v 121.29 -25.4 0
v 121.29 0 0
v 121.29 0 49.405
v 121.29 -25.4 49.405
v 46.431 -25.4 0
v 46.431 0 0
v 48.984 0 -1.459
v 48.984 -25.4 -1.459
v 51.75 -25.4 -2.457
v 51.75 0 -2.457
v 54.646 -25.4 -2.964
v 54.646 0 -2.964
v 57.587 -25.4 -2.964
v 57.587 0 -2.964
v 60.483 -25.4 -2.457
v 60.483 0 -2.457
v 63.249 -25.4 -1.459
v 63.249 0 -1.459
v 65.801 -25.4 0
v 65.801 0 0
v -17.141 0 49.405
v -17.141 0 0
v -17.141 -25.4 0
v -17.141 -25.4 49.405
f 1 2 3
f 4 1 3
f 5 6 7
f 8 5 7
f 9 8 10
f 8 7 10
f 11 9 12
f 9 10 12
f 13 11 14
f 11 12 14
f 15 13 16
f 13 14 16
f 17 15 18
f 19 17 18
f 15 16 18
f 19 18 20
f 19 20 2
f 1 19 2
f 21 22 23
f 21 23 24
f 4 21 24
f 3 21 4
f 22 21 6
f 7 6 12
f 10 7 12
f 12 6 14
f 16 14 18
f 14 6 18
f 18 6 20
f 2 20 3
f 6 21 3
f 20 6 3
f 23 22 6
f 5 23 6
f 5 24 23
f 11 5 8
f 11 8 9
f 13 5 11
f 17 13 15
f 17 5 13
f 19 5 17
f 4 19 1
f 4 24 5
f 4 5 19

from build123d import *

# Parameters (mm, degrees)
F0_W     = 138.4305804968
F0_H     = 49.4050085545
F1_DEPTH = 25.4
F2_R     = 17.004974152
F3_DEPTH = 25.4


# Not quite as in the source:
# - the program builds the solid bodies; features that only make, move or delete a surface that nothing else refers to are left out


with BuildPart() as f1:
    # F0 (on Front) → F1 (new body)
    with BuildSketch(Plane.XZ):
        with Locations((52.0747005939, 24.7025042772)):
            Rectangle(F0_W, F0_H)
    extrude(amount=F1_DEPTH)

    # F2 (on Front) → F3 (join)
    with BuildSketch(Plane.XZ):
        with Locations((56.1164021492, 13.9775313437)):
            Circle(F2_R)
    extrude(amount=F3_DEPTH)


solid = f1.part
